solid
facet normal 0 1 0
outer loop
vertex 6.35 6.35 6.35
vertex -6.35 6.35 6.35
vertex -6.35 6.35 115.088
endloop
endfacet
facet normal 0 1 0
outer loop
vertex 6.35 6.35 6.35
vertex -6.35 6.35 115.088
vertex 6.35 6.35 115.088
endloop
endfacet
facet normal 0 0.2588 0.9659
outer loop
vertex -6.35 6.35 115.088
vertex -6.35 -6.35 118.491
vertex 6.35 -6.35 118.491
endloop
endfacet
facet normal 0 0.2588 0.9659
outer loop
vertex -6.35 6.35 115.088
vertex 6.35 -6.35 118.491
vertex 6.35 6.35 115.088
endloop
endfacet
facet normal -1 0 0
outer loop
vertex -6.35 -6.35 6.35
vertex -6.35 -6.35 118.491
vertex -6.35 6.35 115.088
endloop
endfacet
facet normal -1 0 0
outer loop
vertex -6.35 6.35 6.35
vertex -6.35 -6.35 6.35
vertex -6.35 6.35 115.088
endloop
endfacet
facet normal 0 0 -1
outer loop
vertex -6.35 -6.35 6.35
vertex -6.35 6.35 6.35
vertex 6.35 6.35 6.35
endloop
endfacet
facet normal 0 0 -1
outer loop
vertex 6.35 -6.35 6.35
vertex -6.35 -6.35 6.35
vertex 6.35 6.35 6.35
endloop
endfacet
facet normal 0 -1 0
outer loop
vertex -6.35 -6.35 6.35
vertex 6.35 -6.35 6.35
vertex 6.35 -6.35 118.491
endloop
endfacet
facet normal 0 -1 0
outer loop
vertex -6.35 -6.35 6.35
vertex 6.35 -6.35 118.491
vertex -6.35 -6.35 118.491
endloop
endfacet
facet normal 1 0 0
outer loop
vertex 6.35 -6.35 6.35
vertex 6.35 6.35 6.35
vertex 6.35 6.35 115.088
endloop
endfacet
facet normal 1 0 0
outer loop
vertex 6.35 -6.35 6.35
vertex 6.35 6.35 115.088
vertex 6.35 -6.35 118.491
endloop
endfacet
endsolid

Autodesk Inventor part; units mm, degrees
ref_plane "Start plane" through (0, 0, 6.35) normal (0, 0, 1) x (1, 0, 0)
ref_plane "End plane" through (0, 0, 118.4911) normal (0, 0, 1) x (1, 0, 0)
sketch "Sketch" plane through (0, 0, 0) normal (0, 0, 1) x (1, 0, 0)
  line L0 (6.35, -6.35) -> (-6.35, -6.35)
  line L1 (-6.35, -6.35) -> (-6.35, 6.35)
  line L2 (-6.35, 6.35) -> (6.35, 6.35)
  line L3 (6.35, 6.35) -> (6.35, -6.35)
  line L4 (-6, 0) -> (8, 0) construction
  line L5 (0, -30) -> (0, 40) construction
  line L6 (0, 54) -> (0, -44) construction
  line L7 (-9.62, 0) -> (13.27, 0) construction
  dimension "d0" = 12.7
  dimension "d1" = 12.7
  dimension "d4" = 6.35
  dimension "d5" = 6.35
extrude "Body" add sketch "Sketch" along normal up to surface (112.1411 mm away) from surface at 6.35
sketch "Sketch3" plane through (0, 0, 0) normal (0, 0, 1) x (1, 0, 0)
  line L0 (0, 0) -> (10, 0)
ref_plane "Work Plane3" through (0, 0, 0) normal (0, -1, 0) x (1, 0, 0)
sketch "Sketch4" plane through (0, 0, 0) normal (0, -1, 0) x (1, 0, 0)
  line L0 (-2, 6.35) -> (12, 6.35)
  line L1 (-2, 118.4911) -> (12, 118.4911)
  dimension "d9" = 112.1411
ref_plane "Work Plane5" through (0, 596.3529, 6.35) normal (0, 0, -1) x (-1, 0, 0)
split "Split2" plane through (0, 596.3529, 6.35) removes the side toward (0, 0, -1)
ref_plane "Work Plane6" through (0, -1.2326, 117.1199) normal (0, 0.2588, 0.9659) x (1, 0, 0)
split "Split3" plane through (0, -1.2326, 117.1199) removes the side toward (0, 0.2588, 0.9659)
equation "\"d0\" = G_W"
equation "\"d1\" = G_H"
equation "\"d4\" = 0.5 * d1"
equation "\"d5\" = 0.5 * d0"
equation "\"d2\" = G_L"
equation "\"G_W\" = 12.7"
equation "\"G_H\" = 12.7"
equation "\"G_L\" = d9"
equation "\"G_OFFSET_START\" = -6.35"
equation "\"G_OFFSET_END\" = -3.22903"
equation "\"d6\" = -G_OFFSET_START"
equation "\"d7\" = G_OFFSET_END + B_L"
equation "\"B_L\" = 121.72015"
properties part number "AISC - 1/2x1/2 - 4.415" material "Steel, Alloy"
